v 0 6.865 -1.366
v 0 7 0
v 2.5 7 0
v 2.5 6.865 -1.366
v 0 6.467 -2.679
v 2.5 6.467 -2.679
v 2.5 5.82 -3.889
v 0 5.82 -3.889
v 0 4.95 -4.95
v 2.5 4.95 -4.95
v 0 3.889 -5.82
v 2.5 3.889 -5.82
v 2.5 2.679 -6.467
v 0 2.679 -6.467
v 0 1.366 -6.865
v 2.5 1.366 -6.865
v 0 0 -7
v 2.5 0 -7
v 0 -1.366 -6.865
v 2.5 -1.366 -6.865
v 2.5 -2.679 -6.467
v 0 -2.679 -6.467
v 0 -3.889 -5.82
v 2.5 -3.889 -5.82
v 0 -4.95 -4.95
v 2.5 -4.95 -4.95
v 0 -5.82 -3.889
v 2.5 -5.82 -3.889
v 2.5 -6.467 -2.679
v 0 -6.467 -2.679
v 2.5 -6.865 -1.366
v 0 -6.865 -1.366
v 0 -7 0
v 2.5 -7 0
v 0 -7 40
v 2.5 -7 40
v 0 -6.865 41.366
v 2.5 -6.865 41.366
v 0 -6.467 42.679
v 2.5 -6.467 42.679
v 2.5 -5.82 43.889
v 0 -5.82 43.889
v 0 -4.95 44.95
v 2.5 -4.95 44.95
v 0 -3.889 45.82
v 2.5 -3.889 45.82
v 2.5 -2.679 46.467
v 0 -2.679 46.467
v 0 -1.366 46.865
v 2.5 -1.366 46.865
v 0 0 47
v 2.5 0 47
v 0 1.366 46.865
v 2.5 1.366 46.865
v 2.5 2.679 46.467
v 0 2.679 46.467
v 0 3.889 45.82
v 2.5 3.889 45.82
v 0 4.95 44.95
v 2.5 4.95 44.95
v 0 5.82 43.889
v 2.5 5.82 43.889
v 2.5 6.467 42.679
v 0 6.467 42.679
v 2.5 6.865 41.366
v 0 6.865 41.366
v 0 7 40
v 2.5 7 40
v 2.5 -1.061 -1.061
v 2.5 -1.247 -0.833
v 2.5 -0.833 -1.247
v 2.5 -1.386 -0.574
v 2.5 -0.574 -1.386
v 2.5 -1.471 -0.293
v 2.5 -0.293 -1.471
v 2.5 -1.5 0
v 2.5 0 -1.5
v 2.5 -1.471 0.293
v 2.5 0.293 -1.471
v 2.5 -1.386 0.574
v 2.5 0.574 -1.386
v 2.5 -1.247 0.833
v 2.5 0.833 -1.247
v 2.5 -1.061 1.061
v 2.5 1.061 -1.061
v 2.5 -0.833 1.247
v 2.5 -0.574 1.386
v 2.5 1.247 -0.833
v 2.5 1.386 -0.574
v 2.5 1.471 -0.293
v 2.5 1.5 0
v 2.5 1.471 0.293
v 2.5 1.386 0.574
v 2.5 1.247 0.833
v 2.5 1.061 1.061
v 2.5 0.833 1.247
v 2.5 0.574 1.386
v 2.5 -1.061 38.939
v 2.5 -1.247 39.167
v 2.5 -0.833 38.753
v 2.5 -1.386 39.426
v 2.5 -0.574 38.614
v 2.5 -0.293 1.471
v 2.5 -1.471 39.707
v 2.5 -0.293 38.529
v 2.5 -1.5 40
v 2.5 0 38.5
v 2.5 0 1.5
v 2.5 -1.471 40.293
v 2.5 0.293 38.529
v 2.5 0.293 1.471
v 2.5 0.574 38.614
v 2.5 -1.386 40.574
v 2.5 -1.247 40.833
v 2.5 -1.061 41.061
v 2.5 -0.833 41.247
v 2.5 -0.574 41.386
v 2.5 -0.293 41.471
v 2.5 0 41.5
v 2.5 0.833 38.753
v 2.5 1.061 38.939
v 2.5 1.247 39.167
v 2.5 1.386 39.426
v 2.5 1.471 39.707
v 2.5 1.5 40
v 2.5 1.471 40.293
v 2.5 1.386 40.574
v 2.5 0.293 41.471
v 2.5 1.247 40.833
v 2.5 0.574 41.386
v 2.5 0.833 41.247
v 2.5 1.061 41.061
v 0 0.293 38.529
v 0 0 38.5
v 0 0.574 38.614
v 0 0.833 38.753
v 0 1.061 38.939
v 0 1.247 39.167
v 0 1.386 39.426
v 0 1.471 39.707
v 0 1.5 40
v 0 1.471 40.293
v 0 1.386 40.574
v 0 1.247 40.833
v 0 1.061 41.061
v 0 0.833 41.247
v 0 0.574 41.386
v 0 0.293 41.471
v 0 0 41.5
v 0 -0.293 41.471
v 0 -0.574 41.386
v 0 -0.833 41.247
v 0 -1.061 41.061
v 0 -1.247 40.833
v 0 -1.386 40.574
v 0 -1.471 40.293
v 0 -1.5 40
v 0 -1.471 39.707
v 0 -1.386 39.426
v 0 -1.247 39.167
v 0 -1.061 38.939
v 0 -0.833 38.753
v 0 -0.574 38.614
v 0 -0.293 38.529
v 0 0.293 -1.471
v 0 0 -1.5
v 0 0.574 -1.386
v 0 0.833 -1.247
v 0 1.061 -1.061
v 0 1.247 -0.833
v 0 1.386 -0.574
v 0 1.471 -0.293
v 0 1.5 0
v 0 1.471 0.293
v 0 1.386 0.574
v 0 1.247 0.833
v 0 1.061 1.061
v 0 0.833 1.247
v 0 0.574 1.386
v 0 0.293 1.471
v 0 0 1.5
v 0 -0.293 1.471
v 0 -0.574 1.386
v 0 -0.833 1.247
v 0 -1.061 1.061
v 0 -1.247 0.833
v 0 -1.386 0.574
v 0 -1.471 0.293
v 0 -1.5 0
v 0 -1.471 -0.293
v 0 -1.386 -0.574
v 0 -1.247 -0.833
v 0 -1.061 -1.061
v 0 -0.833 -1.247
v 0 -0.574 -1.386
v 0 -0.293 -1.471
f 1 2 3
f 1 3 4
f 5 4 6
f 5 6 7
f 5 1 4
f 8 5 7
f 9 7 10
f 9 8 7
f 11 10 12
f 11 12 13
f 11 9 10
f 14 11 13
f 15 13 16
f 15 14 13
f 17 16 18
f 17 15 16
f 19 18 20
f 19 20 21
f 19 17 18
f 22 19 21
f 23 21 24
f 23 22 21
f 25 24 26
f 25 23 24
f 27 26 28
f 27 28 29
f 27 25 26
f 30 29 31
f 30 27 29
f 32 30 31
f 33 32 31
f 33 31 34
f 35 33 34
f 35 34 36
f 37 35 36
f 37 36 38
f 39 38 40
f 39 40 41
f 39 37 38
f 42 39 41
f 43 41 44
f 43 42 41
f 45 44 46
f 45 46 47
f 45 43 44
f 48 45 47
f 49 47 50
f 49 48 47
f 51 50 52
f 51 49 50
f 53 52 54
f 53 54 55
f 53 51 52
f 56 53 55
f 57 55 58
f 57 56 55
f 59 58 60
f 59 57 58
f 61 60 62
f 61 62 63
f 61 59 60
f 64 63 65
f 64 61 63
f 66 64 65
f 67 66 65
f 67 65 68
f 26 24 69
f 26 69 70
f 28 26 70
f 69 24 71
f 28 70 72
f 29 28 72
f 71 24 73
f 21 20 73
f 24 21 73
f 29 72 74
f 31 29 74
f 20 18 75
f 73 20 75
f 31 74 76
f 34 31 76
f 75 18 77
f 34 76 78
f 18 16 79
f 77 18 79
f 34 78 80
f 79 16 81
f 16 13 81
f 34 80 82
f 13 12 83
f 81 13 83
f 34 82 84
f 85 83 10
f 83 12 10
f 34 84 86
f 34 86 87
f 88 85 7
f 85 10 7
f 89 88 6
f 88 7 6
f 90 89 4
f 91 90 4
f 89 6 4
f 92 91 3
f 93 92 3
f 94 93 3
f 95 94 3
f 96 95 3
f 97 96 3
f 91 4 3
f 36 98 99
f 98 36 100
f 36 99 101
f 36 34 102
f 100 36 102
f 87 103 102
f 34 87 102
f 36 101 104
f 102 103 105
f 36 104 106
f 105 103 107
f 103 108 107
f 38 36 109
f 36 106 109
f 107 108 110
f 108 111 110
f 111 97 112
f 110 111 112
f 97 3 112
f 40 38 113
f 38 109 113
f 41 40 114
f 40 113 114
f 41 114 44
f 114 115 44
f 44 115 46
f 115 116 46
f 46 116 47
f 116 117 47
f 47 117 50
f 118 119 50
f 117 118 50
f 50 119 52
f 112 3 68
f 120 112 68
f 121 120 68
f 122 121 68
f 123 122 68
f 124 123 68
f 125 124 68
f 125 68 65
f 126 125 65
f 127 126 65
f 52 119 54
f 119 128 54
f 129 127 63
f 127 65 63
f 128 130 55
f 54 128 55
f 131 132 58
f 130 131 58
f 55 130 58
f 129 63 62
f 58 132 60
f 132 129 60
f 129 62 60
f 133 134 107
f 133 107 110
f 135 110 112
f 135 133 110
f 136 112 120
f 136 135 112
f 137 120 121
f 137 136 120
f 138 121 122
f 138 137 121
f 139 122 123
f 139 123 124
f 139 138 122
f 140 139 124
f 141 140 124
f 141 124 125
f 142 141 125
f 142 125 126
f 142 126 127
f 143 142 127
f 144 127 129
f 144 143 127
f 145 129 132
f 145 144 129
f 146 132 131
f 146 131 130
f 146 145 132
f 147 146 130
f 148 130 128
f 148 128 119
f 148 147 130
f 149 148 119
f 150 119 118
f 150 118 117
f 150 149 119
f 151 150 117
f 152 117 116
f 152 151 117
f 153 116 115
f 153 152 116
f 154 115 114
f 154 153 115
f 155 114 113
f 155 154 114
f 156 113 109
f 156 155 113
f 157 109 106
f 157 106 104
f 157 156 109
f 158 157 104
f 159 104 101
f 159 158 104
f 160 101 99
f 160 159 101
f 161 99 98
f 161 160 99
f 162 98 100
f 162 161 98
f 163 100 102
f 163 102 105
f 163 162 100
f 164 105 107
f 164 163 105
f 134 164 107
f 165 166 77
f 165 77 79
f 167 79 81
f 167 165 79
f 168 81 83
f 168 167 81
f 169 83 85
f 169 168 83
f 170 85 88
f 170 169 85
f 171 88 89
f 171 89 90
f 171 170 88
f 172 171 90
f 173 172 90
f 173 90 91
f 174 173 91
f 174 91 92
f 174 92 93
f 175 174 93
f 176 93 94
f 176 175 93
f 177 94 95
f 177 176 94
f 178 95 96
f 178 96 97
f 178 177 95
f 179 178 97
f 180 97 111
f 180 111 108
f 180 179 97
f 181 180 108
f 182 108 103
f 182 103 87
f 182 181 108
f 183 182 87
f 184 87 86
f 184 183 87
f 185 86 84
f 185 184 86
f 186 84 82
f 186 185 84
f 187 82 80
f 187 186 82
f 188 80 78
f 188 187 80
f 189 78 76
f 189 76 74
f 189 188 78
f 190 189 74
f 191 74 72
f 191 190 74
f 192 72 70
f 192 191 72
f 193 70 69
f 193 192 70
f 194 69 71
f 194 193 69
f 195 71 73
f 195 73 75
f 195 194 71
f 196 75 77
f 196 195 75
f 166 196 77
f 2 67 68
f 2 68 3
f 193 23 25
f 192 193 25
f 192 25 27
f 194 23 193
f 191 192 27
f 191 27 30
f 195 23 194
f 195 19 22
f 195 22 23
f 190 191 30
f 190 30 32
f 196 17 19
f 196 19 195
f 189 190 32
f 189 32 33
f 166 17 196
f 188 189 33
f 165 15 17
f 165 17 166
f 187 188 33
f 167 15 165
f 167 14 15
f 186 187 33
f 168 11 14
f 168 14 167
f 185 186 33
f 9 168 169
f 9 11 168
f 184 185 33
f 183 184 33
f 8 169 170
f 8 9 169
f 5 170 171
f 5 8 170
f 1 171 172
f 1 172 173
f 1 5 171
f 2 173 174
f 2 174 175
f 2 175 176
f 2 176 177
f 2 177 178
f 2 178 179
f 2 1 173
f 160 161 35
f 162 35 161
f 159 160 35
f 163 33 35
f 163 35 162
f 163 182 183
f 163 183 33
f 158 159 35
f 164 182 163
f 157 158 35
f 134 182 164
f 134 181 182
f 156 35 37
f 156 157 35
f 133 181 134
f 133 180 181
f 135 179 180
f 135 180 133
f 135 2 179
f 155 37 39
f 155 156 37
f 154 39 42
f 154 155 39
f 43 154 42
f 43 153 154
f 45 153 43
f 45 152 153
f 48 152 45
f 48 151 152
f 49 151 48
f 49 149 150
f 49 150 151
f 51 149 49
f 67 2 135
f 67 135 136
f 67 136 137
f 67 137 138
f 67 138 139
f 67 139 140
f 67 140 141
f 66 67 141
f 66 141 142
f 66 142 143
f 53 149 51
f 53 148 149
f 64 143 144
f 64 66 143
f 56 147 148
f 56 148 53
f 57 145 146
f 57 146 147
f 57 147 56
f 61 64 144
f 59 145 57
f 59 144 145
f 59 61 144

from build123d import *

# Parameters (mm, degrees)
SKETCH1_R           = 1.5
BOSS_EXTRUDE1_DEPTH = 2.5


with BuildPart() as part:
    # Sketch1 → Boss-Extrude1 (new body)
    with BuildSketch(Plane(origin=(0, 0, 0), x_dir=(0, 0, -1), z_dir=(1, 0, 0))):
        with BuildLine():
            Line((0, -7), (-40, -7))
            ThreePointArc((-40, -7), (-47, 0), (-40, 7))
            Line((-40, 7), (0, 7))
            ThreePointArc((0, 7), (7, 0), (0, -7))
        make_face()
        with Locations((-40, 0)):
            Circle(SKETCH1_R, mode=Mode.SUBTRACT)
        Circle(SKETCH1_R, mode=Mode.SUBTRACT)
    extrude(amount=BOSS_EXTRUDE1_DEPTH)


solid = part.part
